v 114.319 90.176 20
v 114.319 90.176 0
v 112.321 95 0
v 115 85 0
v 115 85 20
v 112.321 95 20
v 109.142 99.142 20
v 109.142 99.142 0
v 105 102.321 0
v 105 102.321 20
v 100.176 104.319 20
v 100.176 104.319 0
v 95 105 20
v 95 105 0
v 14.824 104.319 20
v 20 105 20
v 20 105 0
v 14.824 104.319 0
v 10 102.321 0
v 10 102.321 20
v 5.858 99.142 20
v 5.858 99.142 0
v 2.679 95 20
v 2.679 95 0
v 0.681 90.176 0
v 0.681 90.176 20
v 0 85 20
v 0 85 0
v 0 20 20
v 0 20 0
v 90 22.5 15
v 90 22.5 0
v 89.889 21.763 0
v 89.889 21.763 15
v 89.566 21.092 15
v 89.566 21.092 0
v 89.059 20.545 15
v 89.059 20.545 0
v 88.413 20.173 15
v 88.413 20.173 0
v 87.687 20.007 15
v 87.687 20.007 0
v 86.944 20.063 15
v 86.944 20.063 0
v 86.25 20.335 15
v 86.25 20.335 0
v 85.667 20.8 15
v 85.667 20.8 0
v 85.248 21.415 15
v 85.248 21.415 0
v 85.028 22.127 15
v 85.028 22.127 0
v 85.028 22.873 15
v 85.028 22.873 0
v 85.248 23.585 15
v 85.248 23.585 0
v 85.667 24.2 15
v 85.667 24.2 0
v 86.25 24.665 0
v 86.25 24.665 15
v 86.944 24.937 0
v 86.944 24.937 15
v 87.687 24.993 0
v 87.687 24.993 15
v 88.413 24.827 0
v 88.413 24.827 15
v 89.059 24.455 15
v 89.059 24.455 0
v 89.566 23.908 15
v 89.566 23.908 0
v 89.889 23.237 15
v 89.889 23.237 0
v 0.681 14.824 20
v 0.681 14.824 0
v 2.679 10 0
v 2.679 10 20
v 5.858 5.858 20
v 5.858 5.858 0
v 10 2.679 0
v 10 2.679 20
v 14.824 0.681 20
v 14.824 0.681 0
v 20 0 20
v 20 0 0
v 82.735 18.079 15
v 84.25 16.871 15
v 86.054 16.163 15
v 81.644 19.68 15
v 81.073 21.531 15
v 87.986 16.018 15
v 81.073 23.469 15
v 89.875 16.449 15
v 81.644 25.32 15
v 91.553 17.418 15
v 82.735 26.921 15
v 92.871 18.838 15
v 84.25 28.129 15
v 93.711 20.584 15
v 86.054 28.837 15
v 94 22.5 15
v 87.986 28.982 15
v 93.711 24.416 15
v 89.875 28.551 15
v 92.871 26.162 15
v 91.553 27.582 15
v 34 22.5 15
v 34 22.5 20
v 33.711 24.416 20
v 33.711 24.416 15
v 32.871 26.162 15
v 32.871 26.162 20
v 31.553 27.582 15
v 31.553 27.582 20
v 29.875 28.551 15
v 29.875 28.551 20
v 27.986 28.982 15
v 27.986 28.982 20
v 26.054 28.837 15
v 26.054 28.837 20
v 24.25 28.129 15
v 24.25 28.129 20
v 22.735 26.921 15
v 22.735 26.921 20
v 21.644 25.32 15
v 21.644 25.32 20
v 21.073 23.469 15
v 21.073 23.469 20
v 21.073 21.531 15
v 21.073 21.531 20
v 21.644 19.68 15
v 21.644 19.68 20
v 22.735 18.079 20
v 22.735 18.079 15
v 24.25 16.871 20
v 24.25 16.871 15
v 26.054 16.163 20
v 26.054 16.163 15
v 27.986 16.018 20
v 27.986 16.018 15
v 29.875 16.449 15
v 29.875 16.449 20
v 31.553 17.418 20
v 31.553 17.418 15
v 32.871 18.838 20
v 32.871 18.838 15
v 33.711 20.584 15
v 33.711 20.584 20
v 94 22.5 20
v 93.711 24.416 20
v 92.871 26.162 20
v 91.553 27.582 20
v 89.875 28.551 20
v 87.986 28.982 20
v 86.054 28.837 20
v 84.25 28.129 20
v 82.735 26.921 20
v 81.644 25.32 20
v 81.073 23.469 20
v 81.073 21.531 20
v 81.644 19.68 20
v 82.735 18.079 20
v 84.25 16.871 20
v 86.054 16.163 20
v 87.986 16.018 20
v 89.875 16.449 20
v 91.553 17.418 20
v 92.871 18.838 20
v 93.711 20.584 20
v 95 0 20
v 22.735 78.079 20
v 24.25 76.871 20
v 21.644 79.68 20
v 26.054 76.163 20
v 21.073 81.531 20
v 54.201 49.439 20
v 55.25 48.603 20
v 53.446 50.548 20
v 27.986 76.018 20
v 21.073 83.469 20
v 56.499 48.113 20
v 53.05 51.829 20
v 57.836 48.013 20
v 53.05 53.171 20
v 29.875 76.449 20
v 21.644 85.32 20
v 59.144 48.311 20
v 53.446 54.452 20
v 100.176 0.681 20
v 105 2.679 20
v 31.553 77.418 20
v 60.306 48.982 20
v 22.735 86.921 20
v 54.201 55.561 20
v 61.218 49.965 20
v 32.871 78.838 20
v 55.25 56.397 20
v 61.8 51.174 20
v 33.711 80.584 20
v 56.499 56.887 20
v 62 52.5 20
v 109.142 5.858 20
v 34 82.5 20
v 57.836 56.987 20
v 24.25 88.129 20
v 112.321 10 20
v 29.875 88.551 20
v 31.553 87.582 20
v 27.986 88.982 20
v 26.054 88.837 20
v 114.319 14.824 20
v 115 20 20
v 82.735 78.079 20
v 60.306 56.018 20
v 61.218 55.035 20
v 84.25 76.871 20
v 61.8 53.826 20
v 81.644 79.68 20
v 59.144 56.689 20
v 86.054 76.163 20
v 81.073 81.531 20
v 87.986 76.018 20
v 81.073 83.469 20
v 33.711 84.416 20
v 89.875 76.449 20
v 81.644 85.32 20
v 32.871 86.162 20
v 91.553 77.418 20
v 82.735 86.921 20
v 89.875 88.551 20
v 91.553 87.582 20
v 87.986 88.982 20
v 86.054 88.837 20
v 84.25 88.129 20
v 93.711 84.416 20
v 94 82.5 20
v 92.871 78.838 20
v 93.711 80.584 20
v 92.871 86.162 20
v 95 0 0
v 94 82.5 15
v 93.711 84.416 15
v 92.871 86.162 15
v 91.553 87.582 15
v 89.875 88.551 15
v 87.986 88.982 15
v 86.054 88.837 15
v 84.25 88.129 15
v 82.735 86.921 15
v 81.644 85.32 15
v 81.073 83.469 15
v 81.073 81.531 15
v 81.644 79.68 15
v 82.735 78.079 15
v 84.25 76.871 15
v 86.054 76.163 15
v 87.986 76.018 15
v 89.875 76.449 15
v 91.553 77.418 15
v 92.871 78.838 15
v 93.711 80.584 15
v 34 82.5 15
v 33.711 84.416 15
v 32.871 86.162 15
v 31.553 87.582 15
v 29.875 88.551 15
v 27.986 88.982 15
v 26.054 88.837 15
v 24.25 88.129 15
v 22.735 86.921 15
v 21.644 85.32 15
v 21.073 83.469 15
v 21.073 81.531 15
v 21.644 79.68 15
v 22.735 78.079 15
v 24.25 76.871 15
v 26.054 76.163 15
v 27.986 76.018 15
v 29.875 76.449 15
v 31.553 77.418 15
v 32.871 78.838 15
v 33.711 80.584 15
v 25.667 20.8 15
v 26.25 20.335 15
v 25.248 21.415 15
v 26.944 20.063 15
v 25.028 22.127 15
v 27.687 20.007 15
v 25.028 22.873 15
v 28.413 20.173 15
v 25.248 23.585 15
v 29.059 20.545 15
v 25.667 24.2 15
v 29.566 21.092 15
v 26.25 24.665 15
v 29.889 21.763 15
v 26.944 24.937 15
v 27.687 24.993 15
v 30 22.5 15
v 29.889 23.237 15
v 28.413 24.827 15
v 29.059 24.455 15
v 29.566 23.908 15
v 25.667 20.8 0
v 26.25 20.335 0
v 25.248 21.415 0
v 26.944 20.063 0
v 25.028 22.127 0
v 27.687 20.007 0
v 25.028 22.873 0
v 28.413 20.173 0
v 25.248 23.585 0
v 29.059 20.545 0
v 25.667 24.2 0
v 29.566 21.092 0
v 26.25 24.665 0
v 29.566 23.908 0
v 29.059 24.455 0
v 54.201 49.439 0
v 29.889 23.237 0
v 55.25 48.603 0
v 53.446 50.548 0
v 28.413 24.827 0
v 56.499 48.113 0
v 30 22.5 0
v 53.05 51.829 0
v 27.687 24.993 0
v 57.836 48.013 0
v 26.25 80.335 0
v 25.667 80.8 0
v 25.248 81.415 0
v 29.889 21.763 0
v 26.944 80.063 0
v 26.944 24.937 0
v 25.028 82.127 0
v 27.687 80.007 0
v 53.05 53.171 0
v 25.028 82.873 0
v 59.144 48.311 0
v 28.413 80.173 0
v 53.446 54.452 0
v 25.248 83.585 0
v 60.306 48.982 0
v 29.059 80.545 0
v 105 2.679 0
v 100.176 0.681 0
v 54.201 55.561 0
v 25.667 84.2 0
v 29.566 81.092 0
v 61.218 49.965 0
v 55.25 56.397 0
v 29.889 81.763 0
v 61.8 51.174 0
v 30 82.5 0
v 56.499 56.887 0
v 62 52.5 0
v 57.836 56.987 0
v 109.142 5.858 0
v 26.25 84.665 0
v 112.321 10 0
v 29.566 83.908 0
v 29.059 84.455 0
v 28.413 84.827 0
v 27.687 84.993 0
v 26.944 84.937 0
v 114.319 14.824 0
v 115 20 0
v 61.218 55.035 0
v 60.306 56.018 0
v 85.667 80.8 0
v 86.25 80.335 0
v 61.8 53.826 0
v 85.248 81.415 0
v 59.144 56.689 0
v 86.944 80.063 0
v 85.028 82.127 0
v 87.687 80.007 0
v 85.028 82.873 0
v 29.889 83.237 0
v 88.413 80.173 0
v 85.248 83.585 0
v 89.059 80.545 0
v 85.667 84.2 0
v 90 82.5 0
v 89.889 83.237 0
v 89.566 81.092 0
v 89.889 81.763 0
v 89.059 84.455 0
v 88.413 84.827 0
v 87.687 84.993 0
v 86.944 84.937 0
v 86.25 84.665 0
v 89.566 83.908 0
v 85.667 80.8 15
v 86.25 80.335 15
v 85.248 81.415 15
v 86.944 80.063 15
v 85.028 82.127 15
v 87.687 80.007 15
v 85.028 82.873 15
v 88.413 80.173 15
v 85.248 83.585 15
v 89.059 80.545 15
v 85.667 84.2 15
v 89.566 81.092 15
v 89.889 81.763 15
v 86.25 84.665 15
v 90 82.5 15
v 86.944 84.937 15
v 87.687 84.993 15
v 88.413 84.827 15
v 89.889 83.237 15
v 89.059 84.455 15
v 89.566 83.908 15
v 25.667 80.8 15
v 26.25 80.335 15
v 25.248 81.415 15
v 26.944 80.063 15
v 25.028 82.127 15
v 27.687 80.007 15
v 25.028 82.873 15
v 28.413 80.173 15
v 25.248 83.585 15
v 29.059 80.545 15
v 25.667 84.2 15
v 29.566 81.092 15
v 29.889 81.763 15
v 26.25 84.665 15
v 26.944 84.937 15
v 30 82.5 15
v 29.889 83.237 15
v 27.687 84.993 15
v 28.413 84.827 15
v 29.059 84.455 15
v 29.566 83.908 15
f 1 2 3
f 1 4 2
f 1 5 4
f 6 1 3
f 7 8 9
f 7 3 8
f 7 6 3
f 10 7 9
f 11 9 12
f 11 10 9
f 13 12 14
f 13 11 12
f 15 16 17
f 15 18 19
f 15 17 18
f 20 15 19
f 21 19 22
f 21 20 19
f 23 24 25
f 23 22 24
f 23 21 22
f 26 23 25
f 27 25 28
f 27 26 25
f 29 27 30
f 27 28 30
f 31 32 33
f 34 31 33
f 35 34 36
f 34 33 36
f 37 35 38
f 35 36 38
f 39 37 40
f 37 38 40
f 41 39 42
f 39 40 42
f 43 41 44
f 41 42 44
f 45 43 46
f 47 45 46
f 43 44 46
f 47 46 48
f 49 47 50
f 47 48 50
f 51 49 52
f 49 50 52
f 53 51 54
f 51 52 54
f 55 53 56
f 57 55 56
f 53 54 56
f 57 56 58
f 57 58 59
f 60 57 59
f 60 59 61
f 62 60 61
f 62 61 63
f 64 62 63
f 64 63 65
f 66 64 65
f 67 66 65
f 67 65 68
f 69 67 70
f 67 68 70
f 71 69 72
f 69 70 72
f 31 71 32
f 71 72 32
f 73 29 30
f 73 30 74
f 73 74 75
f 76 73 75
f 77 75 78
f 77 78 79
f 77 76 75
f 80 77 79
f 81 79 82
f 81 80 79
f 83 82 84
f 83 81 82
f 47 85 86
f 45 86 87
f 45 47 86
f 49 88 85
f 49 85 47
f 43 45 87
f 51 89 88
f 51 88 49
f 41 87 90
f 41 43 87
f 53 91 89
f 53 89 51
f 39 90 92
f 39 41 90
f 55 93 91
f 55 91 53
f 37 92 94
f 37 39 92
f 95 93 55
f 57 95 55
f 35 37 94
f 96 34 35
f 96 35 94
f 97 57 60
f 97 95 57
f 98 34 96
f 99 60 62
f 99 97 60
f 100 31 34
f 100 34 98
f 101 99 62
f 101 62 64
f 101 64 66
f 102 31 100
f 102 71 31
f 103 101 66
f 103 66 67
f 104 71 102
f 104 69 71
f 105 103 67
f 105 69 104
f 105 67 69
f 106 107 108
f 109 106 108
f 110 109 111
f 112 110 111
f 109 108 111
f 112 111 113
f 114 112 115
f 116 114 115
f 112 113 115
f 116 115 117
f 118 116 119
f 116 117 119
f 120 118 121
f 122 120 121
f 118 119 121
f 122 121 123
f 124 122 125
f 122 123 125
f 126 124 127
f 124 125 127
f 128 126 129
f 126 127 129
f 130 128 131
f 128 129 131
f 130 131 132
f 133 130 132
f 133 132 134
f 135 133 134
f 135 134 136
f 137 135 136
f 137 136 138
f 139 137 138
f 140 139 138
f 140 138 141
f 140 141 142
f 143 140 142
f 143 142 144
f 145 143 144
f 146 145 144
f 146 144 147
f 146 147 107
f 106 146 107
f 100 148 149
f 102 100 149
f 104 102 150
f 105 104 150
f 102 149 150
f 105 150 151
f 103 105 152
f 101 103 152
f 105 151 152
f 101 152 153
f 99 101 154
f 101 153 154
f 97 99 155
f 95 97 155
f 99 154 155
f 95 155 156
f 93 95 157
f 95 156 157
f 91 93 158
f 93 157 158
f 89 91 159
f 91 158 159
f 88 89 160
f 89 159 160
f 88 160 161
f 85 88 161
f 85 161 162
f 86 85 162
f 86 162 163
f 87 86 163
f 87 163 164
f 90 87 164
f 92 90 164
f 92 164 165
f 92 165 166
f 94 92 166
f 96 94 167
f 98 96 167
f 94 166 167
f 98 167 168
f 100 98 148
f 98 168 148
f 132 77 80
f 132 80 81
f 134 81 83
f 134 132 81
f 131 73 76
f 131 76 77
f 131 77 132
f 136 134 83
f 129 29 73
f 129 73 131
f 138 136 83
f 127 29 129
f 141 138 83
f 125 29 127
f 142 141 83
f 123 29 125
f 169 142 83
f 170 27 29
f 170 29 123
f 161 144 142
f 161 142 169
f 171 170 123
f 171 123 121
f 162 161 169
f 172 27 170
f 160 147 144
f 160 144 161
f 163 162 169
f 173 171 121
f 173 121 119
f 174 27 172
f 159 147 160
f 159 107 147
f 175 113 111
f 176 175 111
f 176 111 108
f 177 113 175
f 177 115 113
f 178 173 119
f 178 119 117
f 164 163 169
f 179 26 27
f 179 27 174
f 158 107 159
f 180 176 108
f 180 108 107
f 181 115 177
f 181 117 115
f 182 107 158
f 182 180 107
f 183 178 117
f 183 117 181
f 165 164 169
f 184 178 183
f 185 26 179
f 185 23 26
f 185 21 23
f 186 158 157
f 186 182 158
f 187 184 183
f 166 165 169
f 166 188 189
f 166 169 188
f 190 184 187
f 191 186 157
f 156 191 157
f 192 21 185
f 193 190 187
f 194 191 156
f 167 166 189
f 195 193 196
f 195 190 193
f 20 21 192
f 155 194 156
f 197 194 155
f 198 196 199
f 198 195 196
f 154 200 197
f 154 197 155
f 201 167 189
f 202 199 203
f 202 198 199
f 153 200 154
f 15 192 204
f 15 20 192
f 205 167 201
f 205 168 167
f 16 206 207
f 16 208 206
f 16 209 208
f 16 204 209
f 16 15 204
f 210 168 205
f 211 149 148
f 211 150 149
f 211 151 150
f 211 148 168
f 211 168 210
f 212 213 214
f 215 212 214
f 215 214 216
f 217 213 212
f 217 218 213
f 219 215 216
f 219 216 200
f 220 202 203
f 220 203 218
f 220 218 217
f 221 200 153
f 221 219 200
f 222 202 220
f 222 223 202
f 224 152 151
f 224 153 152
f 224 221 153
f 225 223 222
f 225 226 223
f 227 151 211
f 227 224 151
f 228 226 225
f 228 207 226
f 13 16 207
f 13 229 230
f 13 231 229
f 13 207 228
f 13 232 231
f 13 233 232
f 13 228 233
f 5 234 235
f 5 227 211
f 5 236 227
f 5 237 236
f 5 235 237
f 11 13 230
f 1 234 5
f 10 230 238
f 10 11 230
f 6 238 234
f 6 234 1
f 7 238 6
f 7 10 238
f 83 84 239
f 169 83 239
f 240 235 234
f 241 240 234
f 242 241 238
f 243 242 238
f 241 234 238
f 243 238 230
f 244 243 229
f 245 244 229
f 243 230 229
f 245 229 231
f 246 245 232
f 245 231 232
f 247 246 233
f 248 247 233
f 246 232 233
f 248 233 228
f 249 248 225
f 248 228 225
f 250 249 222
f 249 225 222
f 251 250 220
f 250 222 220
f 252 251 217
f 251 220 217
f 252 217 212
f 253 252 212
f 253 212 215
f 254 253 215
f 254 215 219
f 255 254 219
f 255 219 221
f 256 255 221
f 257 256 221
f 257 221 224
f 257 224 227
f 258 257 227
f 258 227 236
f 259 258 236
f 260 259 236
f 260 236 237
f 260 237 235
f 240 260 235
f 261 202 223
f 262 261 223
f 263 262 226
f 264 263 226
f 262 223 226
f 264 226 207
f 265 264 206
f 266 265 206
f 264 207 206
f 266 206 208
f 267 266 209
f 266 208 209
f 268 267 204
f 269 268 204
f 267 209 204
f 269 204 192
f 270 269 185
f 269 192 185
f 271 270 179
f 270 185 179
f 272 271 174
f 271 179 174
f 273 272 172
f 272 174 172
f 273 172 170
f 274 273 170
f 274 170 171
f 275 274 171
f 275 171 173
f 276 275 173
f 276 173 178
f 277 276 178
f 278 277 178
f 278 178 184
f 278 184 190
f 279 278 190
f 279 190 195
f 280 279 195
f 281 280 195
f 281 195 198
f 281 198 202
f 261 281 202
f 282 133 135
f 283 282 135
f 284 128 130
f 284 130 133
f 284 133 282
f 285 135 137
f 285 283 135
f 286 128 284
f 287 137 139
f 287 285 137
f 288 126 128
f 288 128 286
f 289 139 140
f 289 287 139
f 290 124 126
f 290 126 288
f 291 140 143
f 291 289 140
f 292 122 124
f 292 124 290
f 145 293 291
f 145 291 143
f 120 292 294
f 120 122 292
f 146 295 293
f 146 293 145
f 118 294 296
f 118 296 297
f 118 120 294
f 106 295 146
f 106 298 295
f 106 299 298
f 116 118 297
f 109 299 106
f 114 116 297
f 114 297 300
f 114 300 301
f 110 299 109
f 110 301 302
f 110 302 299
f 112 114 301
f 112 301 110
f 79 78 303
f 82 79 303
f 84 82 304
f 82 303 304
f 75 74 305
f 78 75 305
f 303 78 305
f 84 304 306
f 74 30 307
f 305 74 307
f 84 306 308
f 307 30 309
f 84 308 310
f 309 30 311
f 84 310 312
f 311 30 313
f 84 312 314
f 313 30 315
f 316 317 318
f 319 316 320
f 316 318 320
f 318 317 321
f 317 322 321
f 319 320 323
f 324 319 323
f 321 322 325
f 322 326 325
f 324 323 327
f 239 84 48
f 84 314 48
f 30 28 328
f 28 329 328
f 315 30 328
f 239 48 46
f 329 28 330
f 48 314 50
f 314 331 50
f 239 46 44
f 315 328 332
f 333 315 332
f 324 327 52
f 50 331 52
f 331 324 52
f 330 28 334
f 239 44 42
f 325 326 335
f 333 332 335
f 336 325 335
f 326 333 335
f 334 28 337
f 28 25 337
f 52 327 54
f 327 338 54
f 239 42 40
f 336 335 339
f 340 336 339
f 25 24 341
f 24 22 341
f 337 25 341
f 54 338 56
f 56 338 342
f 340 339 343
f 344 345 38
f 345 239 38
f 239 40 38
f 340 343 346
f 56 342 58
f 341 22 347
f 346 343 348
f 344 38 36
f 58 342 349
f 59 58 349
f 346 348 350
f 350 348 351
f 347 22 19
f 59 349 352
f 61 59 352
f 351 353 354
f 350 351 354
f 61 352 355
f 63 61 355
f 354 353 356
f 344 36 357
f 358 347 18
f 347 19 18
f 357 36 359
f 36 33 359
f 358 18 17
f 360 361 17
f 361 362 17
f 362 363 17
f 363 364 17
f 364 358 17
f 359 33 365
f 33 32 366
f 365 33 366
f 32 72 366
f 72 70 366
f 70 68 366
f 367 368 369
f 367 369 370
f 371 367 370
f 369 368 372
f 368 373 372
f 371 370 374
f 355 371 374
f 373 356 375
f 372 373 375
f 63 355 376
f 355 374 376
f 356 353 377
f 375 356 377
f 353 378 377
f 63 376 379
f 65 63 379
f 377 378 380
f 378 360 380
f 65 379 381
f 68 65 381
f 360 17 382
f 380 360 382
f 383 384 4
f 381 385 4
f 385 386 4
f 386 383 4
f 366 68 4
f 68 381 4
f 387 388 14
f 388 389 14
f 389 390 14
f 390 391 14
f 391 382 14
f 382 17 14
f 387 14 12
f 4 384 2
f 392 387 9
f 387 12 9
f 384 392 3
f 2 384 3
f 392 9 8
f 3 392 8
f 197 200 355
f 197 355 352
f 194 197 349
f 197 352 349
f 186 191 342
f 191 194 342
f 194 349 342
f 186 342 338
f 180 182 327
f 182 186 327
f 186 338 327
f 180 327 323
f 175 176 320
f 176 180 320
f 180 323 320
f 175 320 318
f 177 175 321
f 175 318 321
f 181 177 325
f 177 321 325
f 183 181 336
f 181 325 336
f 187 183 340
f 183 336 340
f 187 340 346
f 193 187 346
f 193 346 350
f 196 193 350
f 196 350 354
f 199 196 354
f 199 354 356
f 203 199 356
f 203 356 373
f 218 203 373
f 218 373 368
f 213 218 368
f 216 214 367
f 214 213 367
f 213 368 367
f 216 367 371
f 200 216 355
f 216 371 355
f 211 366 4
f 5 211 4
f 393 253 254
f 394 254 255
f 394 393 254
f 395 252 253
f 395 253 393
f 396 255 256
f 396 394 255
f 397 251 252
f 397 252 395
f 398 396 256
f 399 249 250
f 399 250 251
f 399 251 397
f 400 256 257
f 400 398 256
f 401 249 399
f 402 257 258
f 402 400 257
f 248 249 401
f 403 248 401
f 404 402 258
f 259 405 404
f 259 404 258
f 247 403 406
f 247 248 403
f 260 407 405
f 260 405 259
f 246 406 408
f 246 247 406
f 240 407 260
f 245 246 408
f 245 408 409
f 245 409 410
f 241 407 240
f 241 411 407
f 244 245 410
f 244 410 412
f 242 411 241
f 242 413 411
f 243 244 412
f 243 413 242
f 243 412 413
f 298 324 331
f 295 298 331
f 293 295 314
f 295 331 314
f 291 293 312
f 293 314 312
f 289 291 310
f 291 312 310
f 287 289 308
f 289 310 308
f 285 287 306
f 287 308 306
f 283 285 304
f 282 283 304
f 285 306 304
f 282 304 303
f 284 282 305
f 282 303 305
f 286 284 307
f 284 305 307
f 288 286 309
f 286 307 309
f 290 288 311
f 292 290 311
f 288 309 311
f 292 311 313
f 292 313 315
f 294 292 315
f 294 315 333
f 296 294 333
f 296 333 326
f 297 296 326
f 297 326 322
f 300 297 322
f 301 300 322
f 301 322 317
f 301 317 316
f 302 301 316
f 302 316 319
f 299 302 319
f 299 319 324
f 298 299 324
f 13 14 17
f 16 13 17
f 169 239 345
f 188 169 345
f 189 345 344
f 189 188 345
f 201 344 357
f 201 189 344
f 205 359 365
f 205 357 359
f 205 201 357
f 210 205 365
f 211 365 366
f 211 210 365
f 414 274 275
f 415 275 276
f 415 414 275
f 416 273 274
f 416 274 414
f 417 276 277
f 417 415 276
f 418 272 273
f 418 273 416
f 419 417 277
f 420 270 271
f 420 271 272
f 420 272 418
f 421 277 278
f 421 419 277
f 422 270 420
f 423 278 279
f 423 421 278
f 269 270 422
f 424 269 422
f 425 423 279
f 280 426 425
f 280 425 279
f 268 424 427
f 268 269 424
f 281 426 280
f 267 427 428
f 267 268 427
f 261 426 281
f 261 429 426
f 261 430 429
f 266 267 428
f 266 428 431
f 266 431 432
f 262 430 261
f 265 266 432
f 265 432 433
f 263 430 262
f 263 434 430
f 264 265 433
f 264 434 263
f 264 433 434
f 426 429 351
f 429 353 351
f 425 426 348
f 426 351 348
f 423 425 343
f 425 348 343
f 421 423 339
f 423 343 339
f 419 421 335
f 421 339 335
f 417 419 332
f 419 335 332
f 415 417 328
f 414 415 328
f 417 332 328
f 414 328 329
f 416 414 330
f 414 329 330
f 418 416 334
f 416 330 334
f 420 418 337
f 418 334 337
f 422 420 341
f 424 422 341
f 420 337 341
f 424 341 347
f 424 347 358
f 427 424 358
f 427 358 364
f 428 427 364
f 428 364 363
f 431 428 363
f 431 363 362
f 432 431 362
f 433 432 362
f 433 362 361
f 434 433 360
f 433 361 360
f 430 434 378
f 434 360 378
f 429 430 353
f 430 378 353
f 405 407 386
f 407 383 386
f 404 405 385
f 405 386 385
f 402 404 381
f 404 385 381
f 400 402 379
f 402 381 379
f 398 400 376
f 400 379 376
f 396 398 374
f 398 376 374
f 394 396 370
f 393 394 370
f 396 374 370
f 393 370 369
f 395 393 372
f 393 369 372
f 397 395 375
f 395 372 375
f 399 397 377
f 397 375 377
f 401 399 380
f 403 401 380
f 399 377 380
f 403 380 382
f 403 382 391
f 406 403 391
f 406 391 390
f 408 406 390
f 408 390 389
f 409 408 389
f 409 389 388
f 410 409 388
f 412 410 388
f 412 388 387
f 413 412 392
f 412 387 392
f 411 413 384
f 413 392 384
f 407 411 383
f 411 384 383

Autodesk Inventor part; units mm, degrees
ref_plane "YZ Plane" through (0, 0, 0) normal (1, 0, 0) x (0, 1, 0)
ref_plane "XZ Plane" through (0, 0, 0) normal (0, 1, 0) x (-1, 0, 0)
ref_plane "XY Plane" through (0, 0, 0) normal (0, 0, 1) x (1, 0, 0)
sketch "Sketch1" plane through (0, 0, 0) normal (0, 0, 1) x (1, 0, 0)
  line L0 (0, 0) -> (115, 0)
  line L1 (115, 0) -> (115, 105)
  line L2 (115, 105) -> (0, 105)
  line L3 (0, 105) -> (0, 0)
  circle A0 centre (57.5, 52.5) radius 4.5
  line L4 (27.5, 22.5) -> (87.5, 22.5) construction
  line L5 (87.5, 22.5) -> (87.5, 82.5) construction
  line L6 (87.5, 82.5) -> (27.5, 82.5) construction
  line L7 (27.5, 82.5) -> (27.5, 22.5) construction
  circle A1 centre (87.5, 82.5) radius 2.5
  circle A2 centre (27.5, 82.5) radius 2.5
  circle A3 centre (27.5, 22.5) radius 2.5
  circle A4 centre (87.5, 22.5) radius 2.5
  point P0 (57.5, 0)
  point P1 (0, 52.5)
  point P2 (27.5, 52.5)
  point P3 (57.5, 82.5)
  dimension "d0" = 115
  dimension "d1" = 105
  dimension "d2" = 9
  dimension "d3" = 60
  dimension "d4" = 60
  dimension "d5" = 5
  dimension "d6" = 5
  dimension "d7" = 5
  dimension "d8" = 5
extrude "Extrusion1" add sketch "Sketch1" along normal blind 20
fillet "Fillet1" radius 20 4 edges at (0, 105, 10) (115, 105, 10) (115, 0, 10) (0, 0, 10)
sketch "Sketch5" plane through (0, 0, 20) normal (0, 0, 1) x (1, 0, 0)
  circle A0 centre (27.5, 82.5) radius 2.5 projected
  circle A1 centre (87.5, 82.5) radius 2.5 projected
  circle A2 centre (87.5, 22.5) radius 2.5 projected
  circle A3 centre (27.5, 22.5) radius 2.5 projected
  circle A4 centre (87.5, 82.5) radius 6.5
  circle A5 centre (87.5, 22.5) radius 6.5
  circle A6 centre (27.5, 22.5) radius 6.5
  circle A7 centre (27.5, 82.5) radius 6.5
  point P0 (0, 0)
  dimension "d18" = 13
  dimension "d19" = 13
  dimension "d20" = 13
  dimension "d21" = 13
extrude "Extrusion4" cut sketch "Sketch5" against normal blind 5 contours A0 | A1 | A2 | A3 | A4 | A5 | A6 | A7
properties part number "AA030" material "ABS Plastic"
